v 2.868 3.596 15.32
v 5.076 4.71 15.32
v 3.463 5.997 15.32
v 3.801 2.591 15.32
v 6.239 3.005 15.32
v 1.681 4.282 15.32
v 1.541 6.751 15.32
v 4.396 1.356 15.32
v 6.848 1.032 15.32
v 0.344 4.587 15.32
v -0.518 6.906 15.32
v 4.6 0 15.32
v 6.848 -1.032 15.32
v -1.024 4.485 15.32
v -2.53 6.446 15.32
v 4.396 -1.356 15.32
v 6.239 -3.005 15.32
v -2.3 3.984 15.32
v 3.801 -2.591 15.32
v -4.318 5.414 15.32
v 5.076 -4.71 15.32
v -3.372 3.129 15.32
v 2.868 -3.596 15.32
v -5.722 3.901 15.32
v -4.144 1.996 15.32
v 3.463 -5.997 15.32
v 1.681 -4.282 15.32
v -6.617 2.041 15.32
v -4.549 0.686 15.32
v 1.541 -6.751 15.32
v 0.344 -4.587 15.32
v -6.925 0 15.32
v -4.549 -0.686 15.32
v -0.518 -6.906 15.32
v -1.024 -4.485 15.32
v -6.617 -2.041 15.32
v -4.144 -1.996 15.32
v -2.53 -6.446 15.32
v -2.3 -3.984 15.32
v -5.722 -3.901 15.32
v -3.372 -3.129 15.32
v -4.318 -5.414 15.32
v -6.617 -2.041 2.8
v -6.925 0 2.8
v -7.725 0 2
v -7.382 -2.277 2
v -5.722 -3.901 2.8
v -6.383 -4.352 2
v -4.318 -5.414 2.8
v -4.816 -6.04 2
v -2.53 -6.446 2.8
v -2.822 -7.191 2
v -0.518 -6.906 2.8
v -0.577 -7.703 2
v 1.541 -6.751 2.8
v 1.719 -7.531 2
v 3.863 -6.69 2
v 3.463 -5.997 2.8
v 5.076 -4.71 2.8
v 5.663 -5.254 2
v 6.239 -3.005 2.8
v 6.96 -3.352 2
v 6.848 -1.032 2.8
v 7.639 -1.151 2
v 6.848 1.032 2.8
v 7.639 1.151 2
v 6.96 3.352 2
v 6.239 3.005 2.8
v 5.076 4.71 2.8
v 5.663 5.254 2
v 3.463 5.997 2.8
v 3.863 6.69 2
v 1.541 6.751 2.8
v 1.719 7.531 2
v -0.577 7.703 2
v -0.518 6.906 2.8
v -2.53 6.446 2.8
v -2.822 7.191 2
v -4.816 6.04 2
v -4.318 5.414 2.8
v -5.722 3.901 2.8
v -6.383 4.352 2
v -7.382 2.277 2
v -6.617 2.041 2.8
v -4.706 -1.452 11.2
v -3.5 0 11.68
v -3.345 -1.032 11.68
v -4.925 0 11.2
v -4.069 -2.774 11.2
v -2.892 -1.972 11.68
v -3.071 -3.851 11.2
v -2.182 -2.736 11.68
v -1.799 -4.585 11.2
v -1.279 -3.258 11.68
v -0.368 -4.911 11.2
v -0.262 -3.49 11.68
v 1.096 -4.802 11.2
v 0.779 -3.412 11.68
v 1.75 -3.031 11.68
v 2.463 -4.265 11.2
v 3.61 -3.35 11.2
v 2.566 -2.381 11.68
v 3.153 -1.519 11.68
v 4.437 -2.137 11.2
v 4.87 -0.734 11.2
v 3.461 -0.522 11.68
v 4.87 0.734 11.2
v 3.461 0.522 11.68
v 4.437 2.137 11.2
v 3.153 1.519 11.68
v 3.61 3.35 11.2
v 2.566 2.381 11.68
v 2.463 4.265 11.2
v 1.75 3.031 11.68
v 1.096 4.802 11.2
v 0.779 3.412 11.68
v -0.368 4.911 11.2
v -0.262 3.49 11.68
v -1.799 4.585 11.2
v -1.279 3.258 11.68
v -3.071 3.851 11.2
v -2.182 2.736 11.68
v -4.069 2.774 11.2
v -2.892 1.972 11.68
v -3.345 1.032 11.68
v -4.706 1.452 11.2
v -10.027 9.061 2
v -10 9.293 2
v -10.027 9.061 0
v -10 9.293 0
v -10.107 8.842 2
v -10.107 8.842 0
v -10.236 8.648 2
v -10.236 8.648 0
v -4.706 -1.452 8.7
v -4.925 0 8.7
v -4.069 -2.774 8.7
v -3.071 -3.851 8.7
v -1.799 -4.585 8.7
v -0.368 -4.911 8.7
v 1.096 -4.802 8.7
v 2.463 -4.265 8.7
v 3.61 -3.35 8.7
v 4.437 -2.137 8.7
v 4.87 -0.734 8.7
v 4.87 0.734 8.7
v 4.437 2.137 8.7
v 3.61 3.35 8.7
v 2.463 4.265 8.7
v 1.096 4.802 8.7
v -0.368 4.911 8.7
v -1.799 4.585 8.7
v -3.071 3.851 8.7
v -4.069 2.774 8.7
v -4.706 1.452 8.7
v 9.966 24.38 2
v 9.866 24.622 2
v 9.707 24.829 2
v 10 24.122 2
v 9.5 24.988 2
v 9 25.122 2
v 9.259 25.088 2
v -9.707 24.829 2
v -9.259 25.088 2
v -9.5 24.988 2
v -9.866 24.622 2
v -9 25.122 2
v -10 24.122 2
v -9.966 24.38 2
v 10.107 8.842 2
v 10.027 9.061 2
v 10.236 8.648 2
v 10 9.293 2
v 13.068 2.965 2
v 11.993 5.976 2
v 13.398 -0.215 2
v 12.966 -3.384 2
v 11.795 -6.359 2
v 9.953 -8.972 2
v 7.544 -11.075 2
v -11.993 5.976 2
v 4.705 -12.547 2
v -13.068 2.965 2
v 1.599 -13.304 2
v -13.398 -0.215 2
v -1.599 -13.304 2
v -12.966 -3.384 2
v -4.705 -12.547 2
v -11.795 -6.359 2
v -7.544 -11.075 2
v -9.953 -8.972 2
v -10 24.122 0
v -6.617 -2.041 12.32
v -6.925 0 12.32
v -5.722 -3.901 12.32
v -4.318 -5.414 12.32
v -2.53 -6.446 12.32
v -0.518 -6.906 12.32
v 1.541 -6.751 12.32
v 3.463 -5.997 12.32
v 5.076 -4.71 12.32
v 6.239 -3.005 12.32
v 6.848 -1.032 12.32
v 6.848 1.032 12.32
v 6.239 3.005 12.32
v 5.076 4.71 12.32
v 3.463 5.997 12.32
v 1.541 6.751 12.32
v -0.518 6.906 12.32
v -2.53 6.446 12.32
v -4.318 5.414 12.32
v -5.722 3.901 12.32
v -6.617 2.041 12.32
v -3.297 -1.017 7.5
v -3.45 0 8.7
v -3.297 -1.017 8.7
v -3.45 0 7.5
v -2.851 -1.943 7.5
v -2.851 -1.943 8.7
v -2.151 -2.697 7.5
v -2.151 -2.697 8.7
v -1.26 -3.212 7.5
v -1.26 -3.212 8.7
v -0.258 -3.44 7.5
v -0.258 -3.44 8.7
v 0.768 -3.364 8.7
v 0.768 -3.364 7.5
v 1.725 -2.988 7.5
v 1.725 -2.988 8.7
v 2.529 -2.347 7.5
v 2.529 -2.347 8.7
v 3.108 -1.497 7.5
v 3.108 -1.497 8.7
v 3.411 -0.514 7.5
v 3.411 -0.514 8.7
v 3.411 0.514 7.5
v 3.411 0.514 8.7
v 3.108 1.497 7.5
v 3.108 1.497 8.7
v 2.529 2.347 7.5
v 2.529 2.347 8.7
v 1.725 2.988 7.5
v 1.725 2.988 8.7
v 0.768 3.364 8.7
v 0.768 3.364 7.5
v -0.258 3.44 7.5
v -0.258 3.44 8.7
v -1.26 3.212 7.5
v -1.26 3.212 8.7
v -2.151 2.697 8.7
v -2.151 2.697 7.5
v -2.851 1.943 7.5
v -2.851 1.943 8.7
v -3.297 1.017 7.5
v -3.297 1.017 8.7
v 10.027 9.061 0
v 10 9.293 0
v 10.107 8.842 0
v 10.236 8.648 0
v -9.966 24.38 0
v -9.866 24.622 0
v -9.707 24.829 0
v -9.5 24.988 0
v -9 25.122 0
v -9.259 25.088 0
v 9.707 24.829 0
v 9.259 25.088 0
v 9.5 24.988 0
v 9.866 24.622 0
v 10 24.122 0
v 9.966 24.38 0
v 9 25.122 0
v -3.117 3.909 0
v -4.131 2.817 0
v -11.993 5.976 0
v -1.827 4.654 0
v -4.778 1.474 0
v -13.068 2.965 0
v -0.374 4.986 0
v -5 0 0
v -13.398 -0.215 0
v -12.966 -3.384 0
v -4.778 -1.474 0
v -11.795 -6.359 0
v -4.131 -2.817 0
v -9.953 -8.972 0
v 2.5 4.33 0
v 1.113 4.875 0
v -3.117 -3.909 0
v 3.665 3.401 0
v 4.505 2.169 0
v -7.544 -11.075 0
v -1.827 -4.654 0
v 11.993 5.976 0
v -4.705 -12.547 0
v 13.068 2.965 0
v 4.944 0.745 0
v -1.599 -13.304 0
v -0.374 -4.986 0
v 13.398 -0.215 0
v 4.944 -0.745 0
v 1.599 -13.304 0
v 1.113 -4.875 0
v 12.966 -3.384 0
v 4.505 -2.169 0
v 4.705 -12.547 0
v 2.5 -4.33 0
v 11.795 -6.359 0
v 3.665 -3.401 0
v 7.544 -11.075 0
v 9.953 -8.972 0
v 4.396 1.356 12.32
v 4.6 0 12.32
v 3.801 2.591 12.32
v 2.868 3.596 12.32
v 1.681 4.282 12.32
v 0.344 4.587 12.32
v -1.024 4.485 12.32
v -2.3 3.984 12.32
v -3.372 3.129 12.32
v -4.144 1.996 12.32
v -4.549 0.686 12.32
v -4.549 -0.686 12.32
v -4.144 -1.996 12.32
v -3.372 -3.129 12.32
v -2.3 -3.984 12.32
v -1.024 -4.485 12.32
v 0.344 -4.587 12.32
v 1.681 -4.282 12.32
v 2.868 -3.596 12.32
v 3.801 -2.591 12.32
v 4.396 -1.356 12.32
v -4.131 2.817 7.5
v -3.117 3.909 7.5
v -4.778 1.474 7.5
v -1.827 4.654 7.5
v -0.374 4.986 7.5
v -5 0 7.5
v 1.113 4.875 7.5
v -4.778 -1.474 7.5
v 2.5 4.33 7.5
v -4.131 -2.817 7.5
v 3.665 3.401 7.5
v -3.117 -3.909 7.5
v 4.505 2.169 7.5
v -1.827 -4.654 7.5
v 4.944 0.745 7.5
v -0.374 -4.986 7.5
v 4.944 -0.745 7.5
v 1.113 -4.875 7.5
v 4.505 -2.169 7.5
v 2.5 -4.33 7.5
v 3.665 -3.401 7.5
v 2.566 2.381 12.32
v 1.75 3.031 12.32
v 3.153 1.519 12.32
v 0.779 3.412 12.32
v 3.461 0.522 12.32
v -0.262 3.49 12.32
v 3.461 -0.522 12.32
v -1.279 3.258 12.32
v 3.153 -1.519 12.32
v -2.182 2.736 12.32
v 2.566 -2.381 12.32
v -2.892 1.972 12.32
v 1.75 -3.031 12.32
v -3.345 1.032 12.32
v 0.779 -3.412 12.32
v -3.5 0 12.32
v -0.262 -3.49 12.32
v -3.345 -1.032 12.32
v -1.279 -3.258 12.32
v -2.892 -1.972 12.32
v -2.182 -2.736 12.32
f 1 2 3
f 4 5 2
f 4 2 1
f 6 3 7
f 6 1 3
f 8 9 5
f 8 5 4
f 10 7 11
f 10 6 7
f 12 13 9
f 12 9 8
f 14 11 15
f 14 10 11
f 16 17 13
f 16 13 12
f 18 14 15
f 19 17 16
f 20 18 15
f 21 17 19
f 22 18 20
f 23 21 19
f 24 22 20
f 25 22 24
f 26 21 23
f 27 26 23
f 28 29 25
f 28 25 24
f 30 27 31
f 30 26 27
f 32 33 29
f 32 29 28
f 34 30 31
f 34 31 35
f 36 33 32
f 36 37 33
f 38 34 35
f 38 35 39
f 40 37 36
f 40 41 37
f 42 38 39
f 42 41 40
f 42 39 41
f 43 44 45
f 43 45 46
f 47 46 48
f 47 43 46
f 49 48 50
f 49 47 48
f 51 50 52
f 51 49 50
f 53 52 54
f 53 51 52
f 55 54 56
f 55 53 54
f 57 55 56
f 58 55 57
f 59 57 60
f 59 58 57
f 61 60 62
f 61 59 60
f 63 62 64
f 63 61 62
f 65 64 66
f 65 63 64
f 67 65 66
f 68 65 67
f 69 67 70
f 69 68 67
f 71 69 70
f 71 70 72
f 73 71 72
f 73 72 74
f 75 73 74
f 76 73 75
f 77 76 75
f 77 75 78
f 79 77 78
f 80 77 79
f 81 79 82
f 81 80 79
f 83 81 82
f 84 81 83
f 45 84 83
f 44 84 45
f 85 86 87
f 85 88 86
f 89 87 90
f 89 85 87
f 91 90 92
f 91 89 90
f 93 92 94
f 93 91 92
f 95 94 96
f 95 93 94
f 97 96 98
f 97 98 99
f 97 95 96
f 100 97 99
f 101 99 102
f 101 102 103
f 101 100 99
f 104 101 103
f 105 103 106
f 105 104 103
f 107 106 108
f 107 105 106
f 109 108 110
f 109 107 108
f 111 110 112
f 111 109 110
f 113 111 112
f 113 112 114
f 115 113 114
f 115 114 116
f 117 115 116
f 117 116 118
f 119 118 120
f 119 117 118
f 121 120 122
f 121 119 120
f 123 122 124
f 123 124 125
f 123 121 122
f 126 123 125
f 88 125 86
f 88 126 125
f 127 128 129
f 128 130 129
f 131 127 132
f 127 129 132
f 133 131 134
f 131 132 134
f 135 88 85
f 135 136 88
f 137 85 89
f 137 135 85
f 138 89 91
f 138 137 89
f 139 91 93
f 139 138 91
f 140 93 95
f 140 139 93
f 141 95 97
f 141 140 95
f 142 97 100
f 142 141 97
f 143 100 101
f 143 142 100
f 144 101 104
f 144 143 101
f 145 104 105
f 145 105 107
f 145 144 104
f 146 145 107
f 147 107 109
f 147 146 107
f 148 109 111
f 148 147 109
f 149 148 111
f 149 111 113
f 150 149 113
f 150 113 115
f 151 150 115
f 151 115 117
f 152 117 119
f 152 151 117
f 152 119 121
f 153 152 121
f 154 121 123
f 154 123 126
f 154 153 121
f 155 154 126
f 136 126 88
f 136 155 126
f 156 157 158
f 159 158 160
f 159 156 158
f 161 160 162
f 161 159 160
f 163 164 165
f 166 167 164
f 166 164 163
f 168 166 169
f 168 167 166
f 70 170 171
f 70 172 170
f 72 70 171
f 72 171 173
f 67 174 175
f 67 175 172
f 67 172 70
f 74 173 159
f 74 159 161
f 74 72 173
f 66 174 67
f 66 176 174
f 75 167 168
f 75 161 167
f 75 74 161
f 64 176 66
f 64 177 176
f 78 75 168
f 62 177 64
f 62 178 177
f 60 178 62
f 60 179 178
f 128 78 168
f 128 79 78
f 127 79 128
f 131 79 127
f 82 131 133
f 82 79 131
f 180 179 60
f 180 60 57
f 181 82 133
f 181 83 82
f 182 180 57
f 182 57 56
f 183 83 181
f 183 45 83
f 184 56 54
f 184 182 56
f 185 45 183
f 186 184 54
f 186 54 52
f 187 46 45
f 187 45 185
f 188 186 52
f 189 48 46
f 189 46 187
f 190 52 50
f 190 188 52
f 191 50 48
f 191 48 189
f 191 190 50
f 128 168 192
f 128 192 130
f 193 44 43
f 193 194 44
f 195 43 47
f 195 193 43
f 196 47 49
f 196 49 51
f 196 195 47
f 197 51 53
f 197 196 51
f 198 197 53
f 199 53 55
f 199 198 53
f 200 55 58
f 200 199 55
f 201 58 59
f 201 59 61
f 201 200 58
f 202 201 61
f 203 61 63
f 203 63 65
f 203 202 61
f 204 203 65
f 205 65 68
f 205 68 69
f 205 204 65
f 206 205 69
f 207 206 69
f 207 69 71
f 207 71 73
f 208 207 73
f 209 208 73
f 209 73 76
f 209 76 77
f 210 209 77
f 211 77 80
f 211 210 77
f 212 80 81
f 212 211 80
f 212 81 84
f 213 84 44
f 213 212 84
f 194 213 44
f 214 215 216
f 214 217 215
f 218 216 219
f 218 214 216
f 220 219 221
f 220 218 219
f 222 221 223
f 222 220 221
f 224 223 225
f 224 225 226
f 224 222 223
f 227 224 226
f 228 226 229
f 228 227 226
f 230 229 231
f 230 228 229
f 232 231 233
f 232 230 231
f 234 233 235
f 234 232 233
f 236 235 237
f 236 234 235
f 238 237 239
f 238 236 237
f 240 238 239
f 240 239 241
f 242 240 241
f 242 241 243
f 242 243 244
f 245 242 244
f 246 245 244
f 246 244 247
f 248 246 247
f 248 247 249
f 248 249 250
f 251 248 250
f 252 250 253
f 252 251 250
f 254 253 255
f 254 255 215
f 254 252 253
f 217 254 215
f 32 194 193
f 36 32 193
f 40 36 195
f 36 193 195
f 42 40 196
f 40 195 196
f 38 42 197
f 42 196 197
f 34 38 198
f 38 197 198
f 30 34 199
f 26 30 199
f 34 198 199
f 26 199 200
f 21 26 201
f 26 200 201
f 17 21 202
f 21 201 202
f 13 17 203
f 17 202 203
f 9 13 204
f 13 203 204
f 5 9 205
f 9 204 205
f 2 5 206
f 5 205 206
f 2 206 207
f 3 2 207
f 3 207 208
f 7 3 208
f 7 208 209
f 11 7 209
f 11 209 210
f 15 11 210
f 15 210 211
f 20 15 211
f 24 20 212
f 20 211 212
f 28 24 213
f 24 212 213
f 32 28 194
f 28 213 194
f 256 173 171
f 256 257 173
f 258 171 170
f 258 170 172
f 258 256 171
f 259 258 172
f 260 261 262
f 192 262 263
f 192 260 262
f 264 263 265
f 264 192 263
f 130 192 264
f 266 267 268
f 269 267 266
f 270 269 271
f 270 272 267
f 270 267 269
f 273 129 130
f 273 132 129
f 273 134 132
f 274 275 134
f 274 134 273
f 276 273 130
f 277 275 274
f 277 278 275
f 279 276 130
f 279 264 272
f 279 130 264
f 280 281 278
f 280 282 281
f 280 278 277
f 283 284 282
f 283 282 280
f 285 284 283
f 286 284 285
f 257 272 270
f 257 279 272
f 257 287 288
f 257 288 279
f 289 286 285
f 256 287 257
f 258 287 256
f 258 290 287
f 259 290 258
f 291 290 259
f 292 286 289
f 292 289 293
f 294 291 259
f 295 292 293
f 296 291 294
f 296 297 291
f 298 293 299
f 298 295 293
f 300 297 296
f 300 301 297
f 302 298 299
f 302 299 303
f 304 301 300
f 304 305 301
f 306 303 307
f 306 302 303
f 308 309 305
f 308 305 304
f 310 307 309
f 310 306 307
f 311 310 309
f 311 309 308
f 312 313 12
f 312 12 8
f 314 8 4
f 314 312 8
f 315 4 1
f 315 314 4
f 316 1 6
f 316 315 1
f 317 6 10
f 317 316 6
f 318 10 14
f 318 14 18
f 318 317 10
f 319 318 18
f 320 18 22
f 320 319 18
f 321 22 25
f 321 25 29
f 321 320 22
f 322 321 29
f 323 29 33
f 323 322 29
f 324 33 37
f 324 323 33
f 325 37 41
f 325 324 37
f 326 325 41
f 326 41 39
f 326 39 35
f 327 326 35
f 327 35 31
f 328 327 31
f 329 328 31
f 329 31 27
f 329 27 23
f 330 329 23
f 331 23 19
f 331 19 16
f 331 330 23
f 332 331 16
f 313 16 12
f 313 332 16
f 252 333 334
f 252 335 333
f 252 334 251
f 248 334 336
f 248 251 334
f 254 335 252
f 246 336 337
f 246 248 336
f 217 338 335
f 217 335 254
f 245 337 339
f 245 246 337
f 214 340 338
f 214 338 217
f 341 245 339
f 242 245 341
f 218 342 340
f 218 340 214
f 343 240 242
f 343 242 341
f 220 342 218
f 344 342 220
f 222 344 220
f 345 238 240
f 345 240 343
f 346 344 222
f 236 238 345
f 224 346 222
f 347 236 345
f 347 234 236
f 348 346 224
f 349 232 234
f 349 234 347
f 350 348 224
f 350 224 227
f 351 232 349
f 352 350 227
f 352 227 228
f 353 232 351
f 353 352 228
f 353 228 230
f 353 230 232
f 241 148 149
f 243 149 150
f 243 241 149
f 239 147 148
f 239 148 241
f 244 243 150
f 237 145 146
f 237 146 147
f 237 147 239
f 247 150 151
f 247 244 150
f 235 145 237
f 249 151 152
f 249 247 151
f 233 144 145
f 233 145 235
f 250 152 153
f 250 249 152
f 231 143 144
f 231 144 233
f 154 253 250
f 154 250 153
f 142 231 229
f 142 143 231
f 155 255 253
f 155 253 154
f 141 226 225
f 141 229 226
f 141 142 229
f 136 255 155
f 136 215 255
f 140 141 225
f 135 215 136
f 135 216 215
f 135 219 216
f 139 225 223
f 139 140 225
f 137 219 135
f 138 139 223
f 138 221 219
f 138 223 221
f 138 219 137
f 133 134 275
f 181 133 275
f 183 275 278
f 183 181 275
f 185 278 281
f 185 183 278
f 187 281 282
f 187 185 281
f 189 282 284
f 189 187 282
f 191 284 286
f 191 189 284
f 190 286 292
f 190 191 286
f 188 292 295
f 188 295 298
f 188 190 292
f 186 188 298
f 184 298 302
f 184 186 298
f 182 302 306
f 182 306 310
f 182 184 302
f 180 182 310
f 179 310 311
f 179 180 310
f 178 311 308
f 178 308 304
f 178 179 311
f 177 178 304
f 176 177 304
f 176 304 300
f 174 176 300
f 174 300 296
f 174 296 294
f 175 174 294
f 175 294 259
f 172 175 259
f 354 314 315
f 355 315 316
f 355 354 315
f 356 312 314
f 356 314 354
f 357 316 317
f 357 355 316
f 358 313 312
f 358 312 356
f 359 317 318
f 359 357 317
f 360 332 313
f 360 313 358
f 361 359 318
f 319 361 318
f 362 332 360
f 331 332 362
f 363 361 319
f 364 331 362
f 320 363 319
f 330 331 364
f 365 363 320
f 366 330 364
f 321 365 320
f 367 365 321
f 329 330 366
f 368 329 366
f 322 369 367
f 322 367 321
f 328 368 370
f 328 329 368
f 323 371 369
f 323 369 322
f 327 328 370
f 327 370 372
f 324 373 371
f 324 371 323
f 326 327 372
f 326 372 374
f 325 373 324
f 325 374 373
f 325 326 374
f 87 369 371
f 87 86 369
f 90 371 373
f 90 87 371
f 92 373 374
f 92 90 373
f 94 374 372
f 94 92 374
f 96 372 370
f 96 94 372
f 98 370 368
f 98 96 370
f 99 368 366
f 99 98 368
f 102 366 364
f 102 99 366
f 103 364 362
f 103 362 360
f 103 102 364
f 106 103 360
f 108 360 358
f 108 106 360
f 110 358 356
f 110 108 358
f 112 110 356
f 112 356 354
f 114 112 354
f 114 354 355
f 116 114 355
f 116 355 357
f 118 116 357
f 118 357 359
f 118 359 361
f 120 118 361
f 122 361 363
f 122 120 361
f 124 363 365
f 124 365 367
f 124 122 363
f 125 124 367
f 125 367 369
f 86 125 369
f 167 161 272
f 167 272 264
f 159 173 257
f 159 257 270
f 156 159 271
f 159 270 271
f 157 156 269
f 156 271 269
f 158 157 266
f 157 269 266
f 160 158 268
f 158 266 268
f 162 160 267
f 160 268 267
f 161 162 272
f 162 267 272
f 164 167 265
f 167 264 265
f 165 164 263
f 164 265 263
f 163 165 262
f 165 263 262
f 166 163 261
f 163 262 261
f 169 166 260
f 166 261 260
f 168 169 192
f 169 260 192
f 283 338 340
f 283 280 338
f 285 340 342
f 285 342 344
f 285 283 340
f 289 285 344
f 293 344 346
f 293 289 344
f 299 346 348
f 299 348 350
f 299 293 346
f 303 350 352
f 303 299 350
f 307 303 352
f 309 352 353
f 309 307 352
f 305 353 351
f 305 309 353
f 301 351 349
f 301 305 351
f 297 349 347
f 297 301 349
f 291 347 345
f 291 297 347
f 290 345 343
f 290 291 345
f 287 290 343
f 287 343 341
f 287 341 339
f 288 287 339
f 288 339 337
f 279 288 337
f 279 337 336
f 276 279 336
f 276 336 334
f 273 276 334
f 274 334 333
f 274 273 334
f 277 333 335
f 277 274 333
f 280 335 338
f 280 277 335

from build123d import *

# Parameters (mm, degrees)
BOSS_EXTRUDE1_DEPTH = 2
FILLET2_R           = 1
CHAMFER1_SIZE       = 0.8
SKETCH4_R           = 6.925
SKETCH4_R_2         = 4.6
BOSS_EXTRUDE2_DEPTH = 3


with BuildPart() as part:
    # Sketch2 → Revolve1 (revolve)
    with BuildSketch(Plane(origin=(0, 0, 0), x_dir=(1, 0, 0), z_dir=(0, 1, 0))):
        Polygon((-3.5, -12.32), (-3.5, -11.68), (-4.925, -11.2), (-4.925, -8.7), (-3.45, -8.7), (-3.45, -7.5), (-5, -7.5), (-5, 0), (-13.4, 0), (-13.4, -2), (-6.925, -2), (-6.925, -12.32), align=None)
    revolve(axis=Axis((0, 0, 0), (0, 0, 1)))

    # Sketch3 → Boss-Extrude1 (add)
    with BuildSketch(Plane.XY.offset(2)):
        with BuildLine():
            Line((10, 8.919641248), (10, 25.121576202))
            Line((10, 25.121576202), (-10, 25.121576202))
            Line((-10, 25.121576202), (-10, 8.919641248))
            ThreePointArc((-10, 8.919641248), (0, 13.4), (10, 8.919641248))
        make_face()
    extrude(amount=-BOSS_EXTRUDE1_DEPTH)

    # Fillet2
    fillet2_edges = [part.edges().sort_by_distance(p)[0] for p in [
        (10, 25.121576202, 1),
        (-10, 25.121576202, 1),
        (-10, 8.919641248, 1),
        (10, 8.919641248, 1),
    ]]
    fillet(fillet2_edges, radius=FILLET2_R)

    # Chamfer1
    chamfer1_edges = [part.edges().sort_by_distance(p)[0] for p in [
        (6.925, 0, 2),
    ]]
    chamfer(chamfer1_edges, length=CHAMFER1_SIZE)

    # Sketch4 → Boss-Extrude2 (add)
    with BuildSketch(Plane.XY.offset(12.32)):
        with Locations(Location((0, 0, 0), (0, 0, 180))):
            Circle(SKETCH4_R)
        Circle(SKETCH4_R_2, mode=Mode.SUBTRACT)
    extrude(amount=BOSS_EXTRUDE2_DEPTH)


solid = part.part
